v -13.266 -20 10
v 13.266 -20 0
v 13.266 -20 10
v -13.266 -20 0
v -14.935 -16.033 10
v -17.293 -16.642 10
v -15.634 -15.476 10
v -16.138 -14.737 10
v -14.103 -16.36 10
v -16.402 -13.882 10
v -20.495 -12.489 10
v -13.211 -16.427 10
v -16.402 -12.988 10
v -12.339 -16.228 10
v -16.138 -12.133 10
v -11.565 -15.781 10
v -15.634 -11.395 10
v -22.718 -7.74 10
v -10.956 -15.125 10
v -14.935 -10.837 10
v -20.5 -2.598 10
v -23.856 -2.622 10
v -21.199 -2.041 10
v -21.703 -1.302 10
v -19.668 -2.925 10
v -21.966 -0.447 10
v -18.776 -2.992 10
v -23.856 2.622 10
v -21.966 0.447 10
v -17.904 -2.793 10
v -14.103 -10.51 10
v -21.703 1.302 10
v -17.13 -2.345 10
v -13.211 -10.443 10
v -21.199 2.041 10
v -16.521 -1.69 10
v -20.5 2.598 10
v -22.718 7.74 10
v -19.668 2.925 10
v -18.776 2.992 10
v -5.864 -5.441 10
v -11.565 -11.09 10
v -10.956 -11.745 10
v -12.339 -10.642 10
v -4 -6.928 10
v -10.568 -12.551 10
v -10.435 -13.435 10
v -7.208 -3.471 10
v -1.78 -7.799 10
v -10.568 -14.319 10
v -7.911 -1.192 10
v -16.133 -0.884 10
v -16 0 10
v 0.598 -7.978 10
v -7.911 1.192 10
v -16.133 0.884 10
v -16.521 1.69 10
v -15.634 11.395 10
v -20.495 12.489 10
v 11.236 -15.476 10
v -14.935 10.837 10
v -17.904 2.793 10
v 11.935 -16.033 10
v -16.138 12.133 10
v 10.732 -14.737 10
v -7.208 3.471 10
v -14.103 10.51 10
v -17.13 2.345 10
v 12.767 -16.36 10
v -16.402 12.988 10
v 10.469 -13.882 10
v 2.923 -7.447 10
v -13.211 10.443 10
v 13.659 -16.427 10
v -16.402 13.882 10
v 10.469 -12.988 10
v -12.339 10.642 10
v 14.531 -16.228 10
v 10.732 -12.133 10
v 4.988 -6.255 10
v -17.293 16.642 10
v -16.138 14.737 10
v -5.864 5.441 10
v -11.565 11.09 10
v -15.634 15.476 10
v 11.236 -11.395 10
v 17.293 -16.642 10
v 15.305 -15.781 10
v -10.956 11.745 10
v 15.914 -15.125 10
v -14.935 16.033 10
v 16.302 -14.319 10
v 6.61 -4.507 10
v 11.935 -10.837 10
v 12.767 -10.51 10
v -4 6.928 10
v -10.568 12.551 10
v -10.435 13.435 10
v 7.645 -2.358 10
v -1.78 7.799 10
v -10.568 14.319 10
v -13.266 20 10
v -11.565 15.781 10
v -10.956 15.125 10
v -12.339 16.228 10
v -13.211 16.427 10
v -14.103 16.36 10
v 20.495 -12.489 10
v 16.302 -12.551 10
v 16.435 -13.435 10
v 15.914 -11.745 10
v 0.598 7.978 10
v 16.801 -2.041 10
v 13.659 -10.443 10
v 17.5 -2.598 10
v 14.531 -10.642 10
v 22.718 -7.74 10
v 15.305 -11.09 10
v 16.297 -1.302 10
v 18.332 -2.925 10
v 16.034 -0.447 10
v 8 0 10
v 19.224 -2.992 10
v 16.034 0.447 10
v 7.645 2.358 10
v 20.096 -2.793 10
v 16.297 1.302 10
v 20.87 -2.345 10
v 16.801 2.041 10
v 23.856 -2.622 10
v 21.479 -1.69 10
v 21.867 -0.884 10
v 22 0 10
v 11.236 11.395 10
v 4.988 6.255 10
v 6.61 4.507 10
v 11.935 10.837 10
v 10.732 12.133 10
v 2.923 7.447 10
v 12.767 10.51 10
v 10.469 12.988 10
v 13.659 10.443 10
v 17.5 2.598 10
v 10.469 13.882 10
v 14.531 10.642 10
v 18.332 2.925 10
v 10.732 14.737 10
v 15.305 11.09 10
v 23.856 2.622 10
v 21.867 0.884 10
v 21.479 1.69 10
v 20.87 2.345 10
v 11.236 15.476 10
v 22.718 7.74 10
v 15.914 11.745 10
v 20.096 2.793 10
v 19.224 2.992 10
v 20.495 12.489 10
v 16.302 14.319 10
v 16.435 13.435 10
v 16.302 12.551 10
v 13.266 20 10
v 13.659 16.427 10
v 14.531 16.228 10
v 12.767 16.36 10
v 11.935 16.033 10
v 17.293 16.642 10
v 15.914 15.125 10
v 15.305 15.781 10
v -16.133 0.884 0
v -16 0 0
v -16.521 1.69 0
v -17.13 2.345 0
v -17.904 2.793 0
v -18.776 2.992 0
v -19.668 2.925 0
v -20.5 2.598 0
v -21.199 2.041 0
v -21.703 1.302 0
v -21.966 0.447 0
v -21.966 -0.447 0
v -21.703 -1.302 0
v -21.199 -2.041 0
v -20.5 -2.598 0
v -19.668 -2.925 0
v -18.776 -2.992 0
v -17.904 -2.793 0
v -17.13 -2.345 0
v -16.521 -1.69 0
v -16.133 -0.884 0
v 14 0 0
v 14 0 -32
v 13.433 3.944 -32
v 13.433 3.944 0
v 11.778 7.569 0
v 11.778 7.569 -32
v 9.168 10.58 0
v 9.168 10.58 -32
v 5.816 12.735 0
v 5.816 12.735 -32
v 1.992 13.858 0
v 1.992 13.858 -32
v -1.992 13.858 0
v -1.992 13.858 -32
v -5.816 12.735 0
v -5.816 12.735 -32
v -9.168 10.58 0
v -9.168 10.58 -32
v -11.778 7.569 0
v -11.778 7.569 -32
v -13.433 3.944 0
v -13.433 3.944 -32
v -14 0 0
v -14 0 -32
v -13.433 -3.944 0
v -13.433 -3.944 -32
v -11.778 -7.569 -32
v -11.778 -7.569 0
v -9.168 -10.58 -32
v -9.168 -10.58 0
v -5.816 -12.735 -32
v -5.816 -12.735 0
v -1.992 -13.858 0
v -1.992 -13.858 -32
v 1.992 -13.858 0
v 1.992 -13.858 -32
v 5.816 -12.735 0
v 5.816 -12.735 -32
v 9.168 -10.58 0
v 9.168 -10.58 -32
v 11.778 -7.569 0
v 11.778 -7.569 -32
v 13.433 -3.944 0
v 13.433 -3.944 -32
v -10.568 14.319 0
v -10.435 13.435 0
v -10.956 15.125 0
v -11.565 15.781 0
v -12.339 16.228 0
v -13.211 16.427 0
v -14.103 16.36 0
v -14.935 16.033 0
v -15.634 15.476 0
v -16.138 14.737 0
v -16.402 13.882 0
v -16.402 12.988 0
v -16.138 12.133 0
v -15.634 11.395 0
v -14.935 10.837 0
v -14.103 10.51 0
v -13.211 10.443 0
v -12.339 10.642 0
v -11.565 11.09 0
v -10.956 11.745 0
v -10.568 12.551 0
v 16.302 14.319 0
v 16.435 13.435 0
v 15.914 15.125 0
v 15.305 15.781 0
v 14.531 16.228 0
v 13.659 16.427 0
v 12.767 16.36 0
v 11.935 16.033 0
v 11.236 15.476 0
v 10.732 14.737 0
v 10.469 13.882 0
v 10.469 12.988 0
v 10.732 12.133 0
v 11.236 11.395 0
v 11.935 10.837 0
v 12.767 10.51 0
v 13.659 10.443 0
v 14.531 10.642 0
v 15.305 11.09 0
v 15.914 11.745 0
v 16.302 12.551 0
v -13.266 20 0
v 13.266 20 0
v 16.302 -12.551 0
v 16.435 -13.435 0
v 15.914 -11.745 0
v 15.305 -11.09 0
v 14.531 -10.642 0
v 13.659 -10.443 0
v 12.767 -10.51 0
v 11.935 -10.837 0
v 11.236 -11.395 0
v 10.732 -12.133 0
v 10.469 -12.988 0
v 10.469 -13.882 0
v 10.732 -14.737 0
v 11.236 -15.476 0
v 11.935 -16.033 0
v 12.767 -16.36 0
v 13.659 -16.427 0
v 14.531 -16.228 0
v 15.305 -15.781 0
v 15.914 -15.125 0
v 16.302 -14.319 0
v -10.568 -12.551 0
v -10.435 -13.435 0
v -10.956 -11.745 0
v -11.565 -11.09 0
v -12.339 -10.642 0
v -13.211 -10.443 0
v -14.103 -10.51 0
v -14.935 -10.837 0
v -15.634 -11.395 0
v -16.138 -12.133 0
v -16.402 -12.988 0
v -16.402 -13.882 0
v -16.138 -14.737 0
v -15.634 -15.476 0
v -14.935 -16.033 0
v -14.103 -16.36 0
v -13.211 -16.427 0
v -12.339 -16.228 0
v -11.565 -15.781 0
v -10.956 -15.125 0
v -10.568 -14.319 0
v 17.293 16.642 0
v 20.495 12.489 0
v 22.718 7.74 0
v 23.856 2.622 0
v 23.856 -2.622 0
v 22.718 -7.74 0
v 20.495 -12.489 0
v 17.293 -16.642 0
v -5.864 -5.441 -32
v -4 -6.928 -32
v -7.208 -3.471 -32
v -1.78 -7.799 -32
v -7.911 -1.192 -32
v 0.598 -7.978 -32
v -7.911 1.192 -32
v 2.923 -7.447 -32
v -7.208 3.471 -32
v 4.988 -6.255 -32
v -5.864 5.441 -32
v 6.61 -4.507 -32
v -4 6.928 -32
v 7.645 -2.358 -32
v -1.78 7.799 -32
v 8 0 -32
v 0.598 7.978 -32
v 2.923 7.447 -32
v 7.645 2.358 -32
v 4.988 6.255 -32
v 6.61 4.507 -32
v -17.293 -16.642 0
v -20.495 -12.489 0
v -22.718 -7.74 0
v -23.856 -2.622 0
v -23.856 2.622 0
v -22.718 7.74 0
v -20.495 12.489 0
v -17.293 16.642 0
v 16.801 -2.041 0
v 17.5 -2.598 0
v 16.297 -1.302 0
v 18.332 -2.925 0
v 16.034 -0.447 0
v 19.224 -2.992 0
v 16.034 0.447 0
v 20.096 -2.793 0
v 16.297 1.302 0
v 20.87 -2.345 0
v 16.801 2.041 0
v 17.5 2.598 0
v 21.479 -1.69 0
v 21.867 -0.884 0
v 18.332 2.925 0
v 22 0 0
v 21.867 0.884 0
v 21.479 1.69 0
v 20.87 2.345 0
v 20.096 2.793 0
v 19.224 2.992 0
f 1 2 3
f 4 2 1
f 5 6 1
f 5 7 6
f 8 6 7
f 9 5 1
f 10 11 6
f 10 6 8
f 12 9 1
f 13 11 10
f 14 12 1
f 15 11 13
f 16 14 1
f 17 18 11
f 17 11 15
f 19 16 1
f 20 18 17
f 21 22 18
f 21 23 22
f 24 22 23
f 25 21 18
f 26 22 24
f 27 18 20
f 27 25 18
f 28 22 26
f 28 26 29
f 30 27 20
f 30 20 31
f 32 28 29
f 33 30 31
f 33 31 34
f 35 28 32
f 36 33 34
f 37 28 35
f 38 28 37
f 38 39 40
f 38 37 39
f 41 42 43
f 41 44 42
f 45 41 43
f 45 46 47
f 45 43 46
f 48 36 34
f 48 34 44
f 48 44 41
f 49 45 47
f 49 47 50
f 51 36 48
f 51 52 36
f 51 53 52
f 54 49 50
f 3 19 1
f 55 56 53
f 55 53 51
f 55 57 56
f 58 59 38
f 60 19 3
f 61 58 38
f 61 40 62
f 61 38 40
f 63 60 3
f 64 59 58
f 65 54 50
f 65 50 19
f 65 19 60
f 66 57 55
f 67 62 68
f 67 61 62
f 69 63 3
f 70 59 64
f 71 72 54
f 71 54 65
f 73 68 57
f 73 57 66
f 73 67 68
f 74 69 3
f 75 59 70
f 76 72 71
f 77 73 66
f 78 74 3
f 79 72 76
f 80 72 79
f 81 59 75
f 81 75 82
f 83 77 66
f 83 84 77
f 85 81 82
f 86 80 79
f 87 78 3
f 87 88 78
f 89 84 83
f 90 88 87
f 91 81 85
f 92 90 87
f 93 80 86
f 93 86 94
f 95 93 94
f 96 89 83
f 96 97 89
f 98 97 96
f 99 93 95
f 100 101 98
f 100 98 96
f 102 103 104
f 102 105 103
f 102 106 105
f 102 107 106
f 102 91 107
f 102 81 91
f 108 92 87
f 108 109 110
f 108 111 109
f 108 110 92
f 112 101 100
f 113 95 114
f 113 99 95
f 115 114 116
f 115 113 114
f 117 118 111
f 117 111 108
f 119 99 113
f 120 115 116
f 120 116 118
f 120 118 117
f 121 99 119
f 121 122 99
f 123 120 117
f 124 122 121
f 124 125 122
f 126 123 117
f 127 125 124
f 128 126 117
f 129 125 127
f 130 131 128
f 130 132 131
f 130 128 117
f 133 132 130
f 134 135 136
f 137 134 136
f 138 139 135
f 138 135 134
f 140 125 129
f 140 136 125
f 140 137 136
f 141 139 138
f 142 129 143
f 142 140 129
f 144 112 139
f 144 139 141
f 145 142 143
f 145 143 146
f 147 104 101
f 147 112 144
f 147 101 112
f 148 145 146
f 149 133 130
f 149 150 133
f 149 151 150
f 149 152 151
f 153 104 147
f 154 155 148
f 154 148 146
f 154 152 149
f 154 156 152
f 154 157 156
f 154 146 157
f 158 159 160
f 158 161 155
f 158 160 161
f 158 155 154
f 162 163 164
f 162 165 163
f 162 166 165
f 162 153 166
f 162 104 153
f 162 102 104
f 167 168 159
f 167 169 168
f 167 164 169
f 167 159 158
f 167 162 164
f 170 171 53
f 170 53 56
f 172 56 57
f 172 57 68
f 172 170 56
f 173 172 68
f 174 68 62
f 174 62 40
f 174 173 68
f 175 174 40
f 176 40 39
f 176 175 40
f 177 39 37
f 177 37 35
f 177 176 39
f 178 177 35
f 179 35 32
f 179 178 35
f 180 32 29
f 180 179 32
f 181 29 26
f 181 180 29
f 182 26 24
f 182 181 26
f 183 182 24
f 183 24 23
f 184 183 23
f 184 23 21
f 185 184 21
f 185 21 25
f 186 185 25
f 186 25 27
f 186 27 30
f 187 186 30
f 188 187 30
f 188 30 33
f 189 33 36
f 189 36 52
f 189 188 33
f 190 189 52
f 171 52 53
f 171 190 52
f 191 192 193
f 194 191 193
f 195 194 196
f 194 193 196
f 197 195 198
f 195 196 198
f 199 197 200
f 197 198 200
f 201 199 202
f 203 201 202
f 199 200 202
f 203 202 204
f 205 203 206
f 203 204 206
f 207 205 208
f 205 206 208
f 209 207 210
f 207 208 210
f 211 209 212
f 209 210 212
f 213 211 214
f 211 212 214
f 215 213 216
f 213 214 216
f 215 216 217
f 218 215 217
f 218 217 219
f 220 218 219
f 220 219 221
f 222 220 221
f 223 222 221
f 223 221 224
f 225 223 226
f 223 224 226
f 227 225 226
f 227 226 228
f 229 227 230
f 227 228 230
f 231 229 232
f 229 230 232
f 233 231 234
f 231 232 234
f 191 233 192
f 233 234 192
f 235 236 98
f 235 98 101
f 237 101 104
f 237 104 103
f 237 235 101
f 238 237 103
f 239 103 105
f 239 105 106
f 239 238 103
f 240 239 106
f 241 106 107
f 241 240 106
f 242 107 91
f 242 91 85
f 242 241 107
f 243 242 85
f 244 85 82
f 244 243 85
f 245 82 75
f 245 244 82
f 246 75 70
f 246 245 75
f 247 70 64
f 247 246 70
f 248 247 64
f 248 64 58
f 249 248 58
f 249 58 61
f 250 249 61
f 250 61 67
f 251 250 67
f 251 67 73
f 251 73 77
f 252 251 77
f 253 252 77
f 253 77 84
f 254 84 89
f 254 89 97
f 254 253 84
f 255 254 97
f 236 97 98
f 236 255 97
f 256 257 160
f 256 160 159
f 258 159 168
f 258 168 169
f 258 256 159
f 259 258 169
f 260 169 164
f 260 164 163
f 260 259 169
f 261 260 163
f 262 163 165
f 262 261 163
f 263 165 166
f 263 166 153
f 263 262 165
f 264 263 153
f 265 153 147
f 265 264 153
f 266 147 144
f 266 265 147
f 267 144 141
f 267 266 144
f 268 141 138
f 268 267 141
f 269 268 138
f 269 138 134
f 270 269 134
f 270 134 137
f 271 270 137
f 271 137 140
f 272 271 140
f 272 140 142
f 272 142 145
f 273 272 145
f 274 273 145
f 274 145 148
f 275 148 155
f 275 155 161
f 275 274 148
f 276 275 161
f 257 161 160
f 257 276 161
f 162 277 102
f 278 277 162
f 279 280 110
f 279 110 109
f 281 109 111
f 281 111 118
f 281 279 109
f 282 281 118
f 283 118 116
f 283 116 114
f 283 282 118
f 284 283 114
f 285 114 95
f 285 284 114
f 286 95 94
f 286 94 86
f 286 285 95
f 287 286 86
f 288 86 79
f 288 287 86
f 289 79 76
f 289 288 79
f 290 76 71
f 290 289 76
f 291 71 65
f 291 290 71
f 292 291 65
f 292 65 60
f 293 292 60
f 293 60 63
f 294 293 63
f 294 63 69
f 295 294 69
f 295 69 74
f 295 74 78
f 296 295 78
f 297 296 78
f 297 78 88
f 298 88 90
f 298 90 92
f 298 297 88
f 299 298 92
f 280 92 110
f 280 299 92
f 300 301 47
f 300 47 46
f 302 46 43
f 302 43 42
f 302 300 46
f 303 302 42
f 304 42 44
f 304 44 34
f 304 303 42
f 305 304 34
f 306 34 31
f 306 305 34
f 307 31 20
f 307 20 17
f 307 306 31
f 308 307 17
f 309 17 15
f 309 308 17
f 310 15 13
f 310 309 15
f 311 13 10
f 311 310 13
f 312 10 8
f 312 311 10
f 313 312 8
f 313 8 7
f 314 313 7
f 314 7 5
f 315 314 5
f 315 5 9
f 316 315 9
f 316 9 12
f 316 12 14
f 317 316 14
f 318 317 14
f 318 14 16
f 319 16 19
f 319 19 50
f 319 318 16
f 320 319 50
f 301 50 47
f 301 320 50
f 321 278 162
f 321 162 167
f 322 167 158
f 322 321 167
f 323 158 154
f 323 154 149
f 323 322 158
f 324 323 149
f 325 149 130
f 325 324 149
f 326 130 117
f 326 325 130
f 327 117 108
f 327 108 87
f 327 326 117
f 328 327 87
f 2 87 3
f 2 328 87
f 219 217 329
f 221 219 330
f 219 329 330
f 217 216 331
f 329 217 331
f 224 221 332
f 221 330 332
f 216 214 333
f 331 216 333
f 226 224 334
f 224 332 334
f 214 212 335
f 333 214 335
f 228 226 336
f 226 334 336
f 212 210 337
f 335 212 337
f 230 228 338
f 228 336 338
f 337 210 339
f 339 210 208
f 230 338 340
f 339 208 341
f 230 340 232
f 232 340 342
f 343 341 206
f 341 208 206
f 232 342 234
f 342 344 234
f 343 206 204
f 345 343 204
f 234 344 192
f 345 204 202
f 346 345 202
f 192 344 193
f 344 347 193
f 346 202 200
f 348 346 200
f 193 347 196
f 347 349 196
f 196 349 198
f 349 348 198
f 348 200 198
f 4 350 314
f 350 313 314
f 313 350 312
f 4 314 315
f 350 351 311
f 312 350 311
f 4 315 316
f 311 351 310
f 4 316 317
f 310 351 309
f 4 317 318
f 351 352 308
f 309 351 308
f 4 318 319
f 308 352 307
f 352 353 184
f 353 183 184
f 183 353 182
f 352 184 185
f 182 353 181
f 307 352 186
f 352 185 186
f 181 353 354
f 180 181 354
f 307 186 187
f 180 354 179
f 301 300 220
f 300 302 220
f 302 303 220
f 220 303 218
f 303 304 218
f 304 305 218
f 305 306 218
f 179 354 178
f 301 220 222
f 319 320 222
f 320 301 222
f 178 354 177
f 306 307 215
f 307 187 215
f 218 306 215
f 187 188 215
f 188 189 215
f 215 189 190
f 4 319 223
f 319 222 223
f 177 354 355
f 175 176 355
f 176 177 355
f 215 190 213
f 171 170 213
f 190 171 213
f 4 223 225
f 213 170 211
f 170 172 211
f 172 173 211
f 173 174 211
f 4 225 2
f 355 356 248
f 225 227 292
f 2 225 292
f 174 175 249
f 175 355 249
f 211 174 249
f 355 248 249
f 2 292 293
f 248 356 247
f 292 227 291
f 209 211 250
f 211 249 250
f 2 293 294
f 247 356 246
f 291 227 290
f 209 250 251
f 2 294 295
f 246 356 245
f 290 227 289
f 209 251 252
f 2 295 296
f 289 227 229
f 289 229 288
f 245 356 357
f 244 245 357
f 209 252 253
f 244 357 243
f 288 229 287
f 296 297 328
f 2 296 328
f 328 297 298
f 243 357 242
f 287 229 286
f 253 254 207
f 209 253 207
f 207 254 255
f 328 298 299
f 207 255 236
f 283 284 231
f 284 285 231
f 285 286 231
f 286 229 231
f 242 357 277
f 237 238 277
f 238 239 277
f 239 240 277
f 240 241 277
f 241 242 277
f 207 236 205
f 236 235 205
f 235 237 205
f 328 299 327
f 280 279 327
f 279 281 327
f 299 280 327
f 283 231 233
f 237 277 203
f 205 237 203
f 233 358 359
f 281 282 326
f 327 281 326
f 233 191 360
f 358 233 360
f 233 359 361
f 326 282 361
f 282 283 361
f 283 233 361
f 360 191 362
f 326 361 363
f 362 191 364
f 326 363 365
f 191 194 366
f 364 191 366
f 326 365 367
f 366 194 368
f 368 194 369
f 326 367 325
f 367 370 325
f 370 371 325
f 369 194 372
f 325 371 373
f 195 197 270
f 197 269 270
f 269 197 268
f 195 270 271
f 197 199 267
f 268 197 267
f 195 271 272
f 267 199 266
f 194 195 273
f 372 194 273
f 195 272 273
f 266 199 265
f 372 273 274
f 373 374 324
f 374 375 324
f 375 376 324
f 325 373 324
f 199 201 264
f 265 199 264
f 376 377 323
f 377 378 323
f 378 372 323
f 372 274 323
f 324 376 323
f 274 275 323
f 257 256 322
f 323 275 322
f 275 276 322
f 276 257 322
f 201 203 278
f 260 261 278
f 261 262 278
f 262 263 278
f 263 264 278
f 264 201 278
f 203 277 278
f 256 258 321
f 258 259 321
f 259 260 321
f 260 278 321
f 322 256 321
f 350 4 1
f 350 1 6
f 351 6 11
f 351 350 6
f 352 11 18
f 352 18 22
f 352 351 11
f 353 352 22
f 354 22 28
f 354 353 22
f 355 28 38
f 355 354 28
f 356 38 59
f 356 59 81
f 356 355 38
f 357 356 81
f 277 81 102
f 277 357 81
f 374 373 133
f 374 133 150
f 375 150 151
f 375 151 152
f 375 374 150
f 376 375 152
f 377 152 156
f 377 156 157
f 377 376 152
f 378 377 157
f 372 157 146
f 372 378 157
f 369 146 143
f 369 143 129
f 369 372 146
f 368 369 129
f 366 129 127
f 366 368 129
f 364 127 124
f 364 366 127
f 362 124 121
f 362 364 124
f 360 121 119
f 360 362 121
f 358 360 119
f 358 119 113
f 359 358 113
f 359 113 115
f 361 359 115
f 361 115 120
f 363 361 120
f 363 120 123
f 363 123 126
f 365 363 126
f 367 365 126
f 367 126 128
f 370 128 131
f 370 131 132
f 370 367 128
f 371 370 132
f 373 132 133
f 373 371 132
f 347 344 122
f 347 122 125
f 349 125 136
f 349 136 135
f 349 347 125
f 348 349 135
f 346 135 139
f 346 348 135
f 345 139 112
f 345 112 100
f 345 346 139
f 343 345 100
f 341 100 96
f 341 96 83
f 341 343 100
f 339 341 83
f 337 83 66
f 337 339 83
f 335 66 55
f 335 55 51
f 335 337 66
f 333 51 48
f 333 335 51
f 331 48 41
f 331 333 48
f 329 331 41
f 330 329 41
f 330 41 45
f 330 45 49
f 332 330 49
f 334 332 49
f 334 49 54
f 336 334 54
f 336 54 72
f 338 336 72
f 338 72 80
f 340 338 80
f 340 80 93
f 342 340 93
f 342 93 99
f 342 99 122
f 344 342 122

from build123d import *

# Parameters (mm, degrees)
SKETCH1_R           = 3
SKETCH1_R_2         = 14
SKETCH1_R_3         = 8
BOSS_EXTRUDE1_DEPTH = 10
BOSS_EXTRUDE2_START = -32
SKETCH1_3_R         = 14
SKETCH1_3_R_2       = 8
BOSS_EXTRUDE2_DEPTH = 32


with BuildPart() as part:
    # Sketch1 → Boss-Extrude1 (new body)
    # profile 1 of 2: a face of its own
    with BuildSketch(Plane.XY):
        with BuildLine():
            Line((-13.266499161, 20), (13.266499161, 20))
            ThreePointArc((13.266499161, 20), (24, 0), (13.266499161, -20))
            Line((13.266499161, -20), (-13.266499161, -20))
            ThreePointArc((-13.266499161, -20), (-24, 0), (-13.266499161, 20))
        make_face()
        with Locations((13.435028843, 13.435028843)):
            Circle(SKETCH1_R, mode=Mode.SUBTRACT)
        with Locations((-13.435028843, 13.435028843)):
            Circle(SKETCH1_R, mode=Mode.SUBTRACT)
        with Locations((-19, 0)):
            Circle(SKETCH1_R, mode=Mode.SUBTRACT)
        with Locations((-13.435028843, -13.435028843)):
            Circle(SKETCH1_R, mode=Mode.SUBTRACT)
        with Locations((13.435028843, -13.435028843)):
            Circle(SKETCH1_R, mode=Mode.SUBTRACT)
        with Locations((19, 0)):
            Circle(SKETCH1_R, mode=Mode.SUBTRACT)
        Circle(SKETCH1_R_2, mode=Mode.SUBTRACT)
    # profile 2 of 2: a face of its own
    with BuildSketch(Plane.XY):
        Circle(SKETCH1_R_2)
        Circle(SKETCH1_R_3, mode=Mode.SUBTRACT)
    extrude(amount=BOSS_EXTRUDE1_DEPTH)

    # Sketch1<3> → Boss-Extrude2 (add)
    with BuildSketch(Plane.XY.offset(BOSS_EXTRUDE2_START)):
        Circle(SKETCH1_3_R)
        Circle(SKETCH1_3_R_2, mode=Mode.SUBTRACT)
    extrude(amount=BOSS_EXTRUDE2_DEPTH)


solid = part.part
